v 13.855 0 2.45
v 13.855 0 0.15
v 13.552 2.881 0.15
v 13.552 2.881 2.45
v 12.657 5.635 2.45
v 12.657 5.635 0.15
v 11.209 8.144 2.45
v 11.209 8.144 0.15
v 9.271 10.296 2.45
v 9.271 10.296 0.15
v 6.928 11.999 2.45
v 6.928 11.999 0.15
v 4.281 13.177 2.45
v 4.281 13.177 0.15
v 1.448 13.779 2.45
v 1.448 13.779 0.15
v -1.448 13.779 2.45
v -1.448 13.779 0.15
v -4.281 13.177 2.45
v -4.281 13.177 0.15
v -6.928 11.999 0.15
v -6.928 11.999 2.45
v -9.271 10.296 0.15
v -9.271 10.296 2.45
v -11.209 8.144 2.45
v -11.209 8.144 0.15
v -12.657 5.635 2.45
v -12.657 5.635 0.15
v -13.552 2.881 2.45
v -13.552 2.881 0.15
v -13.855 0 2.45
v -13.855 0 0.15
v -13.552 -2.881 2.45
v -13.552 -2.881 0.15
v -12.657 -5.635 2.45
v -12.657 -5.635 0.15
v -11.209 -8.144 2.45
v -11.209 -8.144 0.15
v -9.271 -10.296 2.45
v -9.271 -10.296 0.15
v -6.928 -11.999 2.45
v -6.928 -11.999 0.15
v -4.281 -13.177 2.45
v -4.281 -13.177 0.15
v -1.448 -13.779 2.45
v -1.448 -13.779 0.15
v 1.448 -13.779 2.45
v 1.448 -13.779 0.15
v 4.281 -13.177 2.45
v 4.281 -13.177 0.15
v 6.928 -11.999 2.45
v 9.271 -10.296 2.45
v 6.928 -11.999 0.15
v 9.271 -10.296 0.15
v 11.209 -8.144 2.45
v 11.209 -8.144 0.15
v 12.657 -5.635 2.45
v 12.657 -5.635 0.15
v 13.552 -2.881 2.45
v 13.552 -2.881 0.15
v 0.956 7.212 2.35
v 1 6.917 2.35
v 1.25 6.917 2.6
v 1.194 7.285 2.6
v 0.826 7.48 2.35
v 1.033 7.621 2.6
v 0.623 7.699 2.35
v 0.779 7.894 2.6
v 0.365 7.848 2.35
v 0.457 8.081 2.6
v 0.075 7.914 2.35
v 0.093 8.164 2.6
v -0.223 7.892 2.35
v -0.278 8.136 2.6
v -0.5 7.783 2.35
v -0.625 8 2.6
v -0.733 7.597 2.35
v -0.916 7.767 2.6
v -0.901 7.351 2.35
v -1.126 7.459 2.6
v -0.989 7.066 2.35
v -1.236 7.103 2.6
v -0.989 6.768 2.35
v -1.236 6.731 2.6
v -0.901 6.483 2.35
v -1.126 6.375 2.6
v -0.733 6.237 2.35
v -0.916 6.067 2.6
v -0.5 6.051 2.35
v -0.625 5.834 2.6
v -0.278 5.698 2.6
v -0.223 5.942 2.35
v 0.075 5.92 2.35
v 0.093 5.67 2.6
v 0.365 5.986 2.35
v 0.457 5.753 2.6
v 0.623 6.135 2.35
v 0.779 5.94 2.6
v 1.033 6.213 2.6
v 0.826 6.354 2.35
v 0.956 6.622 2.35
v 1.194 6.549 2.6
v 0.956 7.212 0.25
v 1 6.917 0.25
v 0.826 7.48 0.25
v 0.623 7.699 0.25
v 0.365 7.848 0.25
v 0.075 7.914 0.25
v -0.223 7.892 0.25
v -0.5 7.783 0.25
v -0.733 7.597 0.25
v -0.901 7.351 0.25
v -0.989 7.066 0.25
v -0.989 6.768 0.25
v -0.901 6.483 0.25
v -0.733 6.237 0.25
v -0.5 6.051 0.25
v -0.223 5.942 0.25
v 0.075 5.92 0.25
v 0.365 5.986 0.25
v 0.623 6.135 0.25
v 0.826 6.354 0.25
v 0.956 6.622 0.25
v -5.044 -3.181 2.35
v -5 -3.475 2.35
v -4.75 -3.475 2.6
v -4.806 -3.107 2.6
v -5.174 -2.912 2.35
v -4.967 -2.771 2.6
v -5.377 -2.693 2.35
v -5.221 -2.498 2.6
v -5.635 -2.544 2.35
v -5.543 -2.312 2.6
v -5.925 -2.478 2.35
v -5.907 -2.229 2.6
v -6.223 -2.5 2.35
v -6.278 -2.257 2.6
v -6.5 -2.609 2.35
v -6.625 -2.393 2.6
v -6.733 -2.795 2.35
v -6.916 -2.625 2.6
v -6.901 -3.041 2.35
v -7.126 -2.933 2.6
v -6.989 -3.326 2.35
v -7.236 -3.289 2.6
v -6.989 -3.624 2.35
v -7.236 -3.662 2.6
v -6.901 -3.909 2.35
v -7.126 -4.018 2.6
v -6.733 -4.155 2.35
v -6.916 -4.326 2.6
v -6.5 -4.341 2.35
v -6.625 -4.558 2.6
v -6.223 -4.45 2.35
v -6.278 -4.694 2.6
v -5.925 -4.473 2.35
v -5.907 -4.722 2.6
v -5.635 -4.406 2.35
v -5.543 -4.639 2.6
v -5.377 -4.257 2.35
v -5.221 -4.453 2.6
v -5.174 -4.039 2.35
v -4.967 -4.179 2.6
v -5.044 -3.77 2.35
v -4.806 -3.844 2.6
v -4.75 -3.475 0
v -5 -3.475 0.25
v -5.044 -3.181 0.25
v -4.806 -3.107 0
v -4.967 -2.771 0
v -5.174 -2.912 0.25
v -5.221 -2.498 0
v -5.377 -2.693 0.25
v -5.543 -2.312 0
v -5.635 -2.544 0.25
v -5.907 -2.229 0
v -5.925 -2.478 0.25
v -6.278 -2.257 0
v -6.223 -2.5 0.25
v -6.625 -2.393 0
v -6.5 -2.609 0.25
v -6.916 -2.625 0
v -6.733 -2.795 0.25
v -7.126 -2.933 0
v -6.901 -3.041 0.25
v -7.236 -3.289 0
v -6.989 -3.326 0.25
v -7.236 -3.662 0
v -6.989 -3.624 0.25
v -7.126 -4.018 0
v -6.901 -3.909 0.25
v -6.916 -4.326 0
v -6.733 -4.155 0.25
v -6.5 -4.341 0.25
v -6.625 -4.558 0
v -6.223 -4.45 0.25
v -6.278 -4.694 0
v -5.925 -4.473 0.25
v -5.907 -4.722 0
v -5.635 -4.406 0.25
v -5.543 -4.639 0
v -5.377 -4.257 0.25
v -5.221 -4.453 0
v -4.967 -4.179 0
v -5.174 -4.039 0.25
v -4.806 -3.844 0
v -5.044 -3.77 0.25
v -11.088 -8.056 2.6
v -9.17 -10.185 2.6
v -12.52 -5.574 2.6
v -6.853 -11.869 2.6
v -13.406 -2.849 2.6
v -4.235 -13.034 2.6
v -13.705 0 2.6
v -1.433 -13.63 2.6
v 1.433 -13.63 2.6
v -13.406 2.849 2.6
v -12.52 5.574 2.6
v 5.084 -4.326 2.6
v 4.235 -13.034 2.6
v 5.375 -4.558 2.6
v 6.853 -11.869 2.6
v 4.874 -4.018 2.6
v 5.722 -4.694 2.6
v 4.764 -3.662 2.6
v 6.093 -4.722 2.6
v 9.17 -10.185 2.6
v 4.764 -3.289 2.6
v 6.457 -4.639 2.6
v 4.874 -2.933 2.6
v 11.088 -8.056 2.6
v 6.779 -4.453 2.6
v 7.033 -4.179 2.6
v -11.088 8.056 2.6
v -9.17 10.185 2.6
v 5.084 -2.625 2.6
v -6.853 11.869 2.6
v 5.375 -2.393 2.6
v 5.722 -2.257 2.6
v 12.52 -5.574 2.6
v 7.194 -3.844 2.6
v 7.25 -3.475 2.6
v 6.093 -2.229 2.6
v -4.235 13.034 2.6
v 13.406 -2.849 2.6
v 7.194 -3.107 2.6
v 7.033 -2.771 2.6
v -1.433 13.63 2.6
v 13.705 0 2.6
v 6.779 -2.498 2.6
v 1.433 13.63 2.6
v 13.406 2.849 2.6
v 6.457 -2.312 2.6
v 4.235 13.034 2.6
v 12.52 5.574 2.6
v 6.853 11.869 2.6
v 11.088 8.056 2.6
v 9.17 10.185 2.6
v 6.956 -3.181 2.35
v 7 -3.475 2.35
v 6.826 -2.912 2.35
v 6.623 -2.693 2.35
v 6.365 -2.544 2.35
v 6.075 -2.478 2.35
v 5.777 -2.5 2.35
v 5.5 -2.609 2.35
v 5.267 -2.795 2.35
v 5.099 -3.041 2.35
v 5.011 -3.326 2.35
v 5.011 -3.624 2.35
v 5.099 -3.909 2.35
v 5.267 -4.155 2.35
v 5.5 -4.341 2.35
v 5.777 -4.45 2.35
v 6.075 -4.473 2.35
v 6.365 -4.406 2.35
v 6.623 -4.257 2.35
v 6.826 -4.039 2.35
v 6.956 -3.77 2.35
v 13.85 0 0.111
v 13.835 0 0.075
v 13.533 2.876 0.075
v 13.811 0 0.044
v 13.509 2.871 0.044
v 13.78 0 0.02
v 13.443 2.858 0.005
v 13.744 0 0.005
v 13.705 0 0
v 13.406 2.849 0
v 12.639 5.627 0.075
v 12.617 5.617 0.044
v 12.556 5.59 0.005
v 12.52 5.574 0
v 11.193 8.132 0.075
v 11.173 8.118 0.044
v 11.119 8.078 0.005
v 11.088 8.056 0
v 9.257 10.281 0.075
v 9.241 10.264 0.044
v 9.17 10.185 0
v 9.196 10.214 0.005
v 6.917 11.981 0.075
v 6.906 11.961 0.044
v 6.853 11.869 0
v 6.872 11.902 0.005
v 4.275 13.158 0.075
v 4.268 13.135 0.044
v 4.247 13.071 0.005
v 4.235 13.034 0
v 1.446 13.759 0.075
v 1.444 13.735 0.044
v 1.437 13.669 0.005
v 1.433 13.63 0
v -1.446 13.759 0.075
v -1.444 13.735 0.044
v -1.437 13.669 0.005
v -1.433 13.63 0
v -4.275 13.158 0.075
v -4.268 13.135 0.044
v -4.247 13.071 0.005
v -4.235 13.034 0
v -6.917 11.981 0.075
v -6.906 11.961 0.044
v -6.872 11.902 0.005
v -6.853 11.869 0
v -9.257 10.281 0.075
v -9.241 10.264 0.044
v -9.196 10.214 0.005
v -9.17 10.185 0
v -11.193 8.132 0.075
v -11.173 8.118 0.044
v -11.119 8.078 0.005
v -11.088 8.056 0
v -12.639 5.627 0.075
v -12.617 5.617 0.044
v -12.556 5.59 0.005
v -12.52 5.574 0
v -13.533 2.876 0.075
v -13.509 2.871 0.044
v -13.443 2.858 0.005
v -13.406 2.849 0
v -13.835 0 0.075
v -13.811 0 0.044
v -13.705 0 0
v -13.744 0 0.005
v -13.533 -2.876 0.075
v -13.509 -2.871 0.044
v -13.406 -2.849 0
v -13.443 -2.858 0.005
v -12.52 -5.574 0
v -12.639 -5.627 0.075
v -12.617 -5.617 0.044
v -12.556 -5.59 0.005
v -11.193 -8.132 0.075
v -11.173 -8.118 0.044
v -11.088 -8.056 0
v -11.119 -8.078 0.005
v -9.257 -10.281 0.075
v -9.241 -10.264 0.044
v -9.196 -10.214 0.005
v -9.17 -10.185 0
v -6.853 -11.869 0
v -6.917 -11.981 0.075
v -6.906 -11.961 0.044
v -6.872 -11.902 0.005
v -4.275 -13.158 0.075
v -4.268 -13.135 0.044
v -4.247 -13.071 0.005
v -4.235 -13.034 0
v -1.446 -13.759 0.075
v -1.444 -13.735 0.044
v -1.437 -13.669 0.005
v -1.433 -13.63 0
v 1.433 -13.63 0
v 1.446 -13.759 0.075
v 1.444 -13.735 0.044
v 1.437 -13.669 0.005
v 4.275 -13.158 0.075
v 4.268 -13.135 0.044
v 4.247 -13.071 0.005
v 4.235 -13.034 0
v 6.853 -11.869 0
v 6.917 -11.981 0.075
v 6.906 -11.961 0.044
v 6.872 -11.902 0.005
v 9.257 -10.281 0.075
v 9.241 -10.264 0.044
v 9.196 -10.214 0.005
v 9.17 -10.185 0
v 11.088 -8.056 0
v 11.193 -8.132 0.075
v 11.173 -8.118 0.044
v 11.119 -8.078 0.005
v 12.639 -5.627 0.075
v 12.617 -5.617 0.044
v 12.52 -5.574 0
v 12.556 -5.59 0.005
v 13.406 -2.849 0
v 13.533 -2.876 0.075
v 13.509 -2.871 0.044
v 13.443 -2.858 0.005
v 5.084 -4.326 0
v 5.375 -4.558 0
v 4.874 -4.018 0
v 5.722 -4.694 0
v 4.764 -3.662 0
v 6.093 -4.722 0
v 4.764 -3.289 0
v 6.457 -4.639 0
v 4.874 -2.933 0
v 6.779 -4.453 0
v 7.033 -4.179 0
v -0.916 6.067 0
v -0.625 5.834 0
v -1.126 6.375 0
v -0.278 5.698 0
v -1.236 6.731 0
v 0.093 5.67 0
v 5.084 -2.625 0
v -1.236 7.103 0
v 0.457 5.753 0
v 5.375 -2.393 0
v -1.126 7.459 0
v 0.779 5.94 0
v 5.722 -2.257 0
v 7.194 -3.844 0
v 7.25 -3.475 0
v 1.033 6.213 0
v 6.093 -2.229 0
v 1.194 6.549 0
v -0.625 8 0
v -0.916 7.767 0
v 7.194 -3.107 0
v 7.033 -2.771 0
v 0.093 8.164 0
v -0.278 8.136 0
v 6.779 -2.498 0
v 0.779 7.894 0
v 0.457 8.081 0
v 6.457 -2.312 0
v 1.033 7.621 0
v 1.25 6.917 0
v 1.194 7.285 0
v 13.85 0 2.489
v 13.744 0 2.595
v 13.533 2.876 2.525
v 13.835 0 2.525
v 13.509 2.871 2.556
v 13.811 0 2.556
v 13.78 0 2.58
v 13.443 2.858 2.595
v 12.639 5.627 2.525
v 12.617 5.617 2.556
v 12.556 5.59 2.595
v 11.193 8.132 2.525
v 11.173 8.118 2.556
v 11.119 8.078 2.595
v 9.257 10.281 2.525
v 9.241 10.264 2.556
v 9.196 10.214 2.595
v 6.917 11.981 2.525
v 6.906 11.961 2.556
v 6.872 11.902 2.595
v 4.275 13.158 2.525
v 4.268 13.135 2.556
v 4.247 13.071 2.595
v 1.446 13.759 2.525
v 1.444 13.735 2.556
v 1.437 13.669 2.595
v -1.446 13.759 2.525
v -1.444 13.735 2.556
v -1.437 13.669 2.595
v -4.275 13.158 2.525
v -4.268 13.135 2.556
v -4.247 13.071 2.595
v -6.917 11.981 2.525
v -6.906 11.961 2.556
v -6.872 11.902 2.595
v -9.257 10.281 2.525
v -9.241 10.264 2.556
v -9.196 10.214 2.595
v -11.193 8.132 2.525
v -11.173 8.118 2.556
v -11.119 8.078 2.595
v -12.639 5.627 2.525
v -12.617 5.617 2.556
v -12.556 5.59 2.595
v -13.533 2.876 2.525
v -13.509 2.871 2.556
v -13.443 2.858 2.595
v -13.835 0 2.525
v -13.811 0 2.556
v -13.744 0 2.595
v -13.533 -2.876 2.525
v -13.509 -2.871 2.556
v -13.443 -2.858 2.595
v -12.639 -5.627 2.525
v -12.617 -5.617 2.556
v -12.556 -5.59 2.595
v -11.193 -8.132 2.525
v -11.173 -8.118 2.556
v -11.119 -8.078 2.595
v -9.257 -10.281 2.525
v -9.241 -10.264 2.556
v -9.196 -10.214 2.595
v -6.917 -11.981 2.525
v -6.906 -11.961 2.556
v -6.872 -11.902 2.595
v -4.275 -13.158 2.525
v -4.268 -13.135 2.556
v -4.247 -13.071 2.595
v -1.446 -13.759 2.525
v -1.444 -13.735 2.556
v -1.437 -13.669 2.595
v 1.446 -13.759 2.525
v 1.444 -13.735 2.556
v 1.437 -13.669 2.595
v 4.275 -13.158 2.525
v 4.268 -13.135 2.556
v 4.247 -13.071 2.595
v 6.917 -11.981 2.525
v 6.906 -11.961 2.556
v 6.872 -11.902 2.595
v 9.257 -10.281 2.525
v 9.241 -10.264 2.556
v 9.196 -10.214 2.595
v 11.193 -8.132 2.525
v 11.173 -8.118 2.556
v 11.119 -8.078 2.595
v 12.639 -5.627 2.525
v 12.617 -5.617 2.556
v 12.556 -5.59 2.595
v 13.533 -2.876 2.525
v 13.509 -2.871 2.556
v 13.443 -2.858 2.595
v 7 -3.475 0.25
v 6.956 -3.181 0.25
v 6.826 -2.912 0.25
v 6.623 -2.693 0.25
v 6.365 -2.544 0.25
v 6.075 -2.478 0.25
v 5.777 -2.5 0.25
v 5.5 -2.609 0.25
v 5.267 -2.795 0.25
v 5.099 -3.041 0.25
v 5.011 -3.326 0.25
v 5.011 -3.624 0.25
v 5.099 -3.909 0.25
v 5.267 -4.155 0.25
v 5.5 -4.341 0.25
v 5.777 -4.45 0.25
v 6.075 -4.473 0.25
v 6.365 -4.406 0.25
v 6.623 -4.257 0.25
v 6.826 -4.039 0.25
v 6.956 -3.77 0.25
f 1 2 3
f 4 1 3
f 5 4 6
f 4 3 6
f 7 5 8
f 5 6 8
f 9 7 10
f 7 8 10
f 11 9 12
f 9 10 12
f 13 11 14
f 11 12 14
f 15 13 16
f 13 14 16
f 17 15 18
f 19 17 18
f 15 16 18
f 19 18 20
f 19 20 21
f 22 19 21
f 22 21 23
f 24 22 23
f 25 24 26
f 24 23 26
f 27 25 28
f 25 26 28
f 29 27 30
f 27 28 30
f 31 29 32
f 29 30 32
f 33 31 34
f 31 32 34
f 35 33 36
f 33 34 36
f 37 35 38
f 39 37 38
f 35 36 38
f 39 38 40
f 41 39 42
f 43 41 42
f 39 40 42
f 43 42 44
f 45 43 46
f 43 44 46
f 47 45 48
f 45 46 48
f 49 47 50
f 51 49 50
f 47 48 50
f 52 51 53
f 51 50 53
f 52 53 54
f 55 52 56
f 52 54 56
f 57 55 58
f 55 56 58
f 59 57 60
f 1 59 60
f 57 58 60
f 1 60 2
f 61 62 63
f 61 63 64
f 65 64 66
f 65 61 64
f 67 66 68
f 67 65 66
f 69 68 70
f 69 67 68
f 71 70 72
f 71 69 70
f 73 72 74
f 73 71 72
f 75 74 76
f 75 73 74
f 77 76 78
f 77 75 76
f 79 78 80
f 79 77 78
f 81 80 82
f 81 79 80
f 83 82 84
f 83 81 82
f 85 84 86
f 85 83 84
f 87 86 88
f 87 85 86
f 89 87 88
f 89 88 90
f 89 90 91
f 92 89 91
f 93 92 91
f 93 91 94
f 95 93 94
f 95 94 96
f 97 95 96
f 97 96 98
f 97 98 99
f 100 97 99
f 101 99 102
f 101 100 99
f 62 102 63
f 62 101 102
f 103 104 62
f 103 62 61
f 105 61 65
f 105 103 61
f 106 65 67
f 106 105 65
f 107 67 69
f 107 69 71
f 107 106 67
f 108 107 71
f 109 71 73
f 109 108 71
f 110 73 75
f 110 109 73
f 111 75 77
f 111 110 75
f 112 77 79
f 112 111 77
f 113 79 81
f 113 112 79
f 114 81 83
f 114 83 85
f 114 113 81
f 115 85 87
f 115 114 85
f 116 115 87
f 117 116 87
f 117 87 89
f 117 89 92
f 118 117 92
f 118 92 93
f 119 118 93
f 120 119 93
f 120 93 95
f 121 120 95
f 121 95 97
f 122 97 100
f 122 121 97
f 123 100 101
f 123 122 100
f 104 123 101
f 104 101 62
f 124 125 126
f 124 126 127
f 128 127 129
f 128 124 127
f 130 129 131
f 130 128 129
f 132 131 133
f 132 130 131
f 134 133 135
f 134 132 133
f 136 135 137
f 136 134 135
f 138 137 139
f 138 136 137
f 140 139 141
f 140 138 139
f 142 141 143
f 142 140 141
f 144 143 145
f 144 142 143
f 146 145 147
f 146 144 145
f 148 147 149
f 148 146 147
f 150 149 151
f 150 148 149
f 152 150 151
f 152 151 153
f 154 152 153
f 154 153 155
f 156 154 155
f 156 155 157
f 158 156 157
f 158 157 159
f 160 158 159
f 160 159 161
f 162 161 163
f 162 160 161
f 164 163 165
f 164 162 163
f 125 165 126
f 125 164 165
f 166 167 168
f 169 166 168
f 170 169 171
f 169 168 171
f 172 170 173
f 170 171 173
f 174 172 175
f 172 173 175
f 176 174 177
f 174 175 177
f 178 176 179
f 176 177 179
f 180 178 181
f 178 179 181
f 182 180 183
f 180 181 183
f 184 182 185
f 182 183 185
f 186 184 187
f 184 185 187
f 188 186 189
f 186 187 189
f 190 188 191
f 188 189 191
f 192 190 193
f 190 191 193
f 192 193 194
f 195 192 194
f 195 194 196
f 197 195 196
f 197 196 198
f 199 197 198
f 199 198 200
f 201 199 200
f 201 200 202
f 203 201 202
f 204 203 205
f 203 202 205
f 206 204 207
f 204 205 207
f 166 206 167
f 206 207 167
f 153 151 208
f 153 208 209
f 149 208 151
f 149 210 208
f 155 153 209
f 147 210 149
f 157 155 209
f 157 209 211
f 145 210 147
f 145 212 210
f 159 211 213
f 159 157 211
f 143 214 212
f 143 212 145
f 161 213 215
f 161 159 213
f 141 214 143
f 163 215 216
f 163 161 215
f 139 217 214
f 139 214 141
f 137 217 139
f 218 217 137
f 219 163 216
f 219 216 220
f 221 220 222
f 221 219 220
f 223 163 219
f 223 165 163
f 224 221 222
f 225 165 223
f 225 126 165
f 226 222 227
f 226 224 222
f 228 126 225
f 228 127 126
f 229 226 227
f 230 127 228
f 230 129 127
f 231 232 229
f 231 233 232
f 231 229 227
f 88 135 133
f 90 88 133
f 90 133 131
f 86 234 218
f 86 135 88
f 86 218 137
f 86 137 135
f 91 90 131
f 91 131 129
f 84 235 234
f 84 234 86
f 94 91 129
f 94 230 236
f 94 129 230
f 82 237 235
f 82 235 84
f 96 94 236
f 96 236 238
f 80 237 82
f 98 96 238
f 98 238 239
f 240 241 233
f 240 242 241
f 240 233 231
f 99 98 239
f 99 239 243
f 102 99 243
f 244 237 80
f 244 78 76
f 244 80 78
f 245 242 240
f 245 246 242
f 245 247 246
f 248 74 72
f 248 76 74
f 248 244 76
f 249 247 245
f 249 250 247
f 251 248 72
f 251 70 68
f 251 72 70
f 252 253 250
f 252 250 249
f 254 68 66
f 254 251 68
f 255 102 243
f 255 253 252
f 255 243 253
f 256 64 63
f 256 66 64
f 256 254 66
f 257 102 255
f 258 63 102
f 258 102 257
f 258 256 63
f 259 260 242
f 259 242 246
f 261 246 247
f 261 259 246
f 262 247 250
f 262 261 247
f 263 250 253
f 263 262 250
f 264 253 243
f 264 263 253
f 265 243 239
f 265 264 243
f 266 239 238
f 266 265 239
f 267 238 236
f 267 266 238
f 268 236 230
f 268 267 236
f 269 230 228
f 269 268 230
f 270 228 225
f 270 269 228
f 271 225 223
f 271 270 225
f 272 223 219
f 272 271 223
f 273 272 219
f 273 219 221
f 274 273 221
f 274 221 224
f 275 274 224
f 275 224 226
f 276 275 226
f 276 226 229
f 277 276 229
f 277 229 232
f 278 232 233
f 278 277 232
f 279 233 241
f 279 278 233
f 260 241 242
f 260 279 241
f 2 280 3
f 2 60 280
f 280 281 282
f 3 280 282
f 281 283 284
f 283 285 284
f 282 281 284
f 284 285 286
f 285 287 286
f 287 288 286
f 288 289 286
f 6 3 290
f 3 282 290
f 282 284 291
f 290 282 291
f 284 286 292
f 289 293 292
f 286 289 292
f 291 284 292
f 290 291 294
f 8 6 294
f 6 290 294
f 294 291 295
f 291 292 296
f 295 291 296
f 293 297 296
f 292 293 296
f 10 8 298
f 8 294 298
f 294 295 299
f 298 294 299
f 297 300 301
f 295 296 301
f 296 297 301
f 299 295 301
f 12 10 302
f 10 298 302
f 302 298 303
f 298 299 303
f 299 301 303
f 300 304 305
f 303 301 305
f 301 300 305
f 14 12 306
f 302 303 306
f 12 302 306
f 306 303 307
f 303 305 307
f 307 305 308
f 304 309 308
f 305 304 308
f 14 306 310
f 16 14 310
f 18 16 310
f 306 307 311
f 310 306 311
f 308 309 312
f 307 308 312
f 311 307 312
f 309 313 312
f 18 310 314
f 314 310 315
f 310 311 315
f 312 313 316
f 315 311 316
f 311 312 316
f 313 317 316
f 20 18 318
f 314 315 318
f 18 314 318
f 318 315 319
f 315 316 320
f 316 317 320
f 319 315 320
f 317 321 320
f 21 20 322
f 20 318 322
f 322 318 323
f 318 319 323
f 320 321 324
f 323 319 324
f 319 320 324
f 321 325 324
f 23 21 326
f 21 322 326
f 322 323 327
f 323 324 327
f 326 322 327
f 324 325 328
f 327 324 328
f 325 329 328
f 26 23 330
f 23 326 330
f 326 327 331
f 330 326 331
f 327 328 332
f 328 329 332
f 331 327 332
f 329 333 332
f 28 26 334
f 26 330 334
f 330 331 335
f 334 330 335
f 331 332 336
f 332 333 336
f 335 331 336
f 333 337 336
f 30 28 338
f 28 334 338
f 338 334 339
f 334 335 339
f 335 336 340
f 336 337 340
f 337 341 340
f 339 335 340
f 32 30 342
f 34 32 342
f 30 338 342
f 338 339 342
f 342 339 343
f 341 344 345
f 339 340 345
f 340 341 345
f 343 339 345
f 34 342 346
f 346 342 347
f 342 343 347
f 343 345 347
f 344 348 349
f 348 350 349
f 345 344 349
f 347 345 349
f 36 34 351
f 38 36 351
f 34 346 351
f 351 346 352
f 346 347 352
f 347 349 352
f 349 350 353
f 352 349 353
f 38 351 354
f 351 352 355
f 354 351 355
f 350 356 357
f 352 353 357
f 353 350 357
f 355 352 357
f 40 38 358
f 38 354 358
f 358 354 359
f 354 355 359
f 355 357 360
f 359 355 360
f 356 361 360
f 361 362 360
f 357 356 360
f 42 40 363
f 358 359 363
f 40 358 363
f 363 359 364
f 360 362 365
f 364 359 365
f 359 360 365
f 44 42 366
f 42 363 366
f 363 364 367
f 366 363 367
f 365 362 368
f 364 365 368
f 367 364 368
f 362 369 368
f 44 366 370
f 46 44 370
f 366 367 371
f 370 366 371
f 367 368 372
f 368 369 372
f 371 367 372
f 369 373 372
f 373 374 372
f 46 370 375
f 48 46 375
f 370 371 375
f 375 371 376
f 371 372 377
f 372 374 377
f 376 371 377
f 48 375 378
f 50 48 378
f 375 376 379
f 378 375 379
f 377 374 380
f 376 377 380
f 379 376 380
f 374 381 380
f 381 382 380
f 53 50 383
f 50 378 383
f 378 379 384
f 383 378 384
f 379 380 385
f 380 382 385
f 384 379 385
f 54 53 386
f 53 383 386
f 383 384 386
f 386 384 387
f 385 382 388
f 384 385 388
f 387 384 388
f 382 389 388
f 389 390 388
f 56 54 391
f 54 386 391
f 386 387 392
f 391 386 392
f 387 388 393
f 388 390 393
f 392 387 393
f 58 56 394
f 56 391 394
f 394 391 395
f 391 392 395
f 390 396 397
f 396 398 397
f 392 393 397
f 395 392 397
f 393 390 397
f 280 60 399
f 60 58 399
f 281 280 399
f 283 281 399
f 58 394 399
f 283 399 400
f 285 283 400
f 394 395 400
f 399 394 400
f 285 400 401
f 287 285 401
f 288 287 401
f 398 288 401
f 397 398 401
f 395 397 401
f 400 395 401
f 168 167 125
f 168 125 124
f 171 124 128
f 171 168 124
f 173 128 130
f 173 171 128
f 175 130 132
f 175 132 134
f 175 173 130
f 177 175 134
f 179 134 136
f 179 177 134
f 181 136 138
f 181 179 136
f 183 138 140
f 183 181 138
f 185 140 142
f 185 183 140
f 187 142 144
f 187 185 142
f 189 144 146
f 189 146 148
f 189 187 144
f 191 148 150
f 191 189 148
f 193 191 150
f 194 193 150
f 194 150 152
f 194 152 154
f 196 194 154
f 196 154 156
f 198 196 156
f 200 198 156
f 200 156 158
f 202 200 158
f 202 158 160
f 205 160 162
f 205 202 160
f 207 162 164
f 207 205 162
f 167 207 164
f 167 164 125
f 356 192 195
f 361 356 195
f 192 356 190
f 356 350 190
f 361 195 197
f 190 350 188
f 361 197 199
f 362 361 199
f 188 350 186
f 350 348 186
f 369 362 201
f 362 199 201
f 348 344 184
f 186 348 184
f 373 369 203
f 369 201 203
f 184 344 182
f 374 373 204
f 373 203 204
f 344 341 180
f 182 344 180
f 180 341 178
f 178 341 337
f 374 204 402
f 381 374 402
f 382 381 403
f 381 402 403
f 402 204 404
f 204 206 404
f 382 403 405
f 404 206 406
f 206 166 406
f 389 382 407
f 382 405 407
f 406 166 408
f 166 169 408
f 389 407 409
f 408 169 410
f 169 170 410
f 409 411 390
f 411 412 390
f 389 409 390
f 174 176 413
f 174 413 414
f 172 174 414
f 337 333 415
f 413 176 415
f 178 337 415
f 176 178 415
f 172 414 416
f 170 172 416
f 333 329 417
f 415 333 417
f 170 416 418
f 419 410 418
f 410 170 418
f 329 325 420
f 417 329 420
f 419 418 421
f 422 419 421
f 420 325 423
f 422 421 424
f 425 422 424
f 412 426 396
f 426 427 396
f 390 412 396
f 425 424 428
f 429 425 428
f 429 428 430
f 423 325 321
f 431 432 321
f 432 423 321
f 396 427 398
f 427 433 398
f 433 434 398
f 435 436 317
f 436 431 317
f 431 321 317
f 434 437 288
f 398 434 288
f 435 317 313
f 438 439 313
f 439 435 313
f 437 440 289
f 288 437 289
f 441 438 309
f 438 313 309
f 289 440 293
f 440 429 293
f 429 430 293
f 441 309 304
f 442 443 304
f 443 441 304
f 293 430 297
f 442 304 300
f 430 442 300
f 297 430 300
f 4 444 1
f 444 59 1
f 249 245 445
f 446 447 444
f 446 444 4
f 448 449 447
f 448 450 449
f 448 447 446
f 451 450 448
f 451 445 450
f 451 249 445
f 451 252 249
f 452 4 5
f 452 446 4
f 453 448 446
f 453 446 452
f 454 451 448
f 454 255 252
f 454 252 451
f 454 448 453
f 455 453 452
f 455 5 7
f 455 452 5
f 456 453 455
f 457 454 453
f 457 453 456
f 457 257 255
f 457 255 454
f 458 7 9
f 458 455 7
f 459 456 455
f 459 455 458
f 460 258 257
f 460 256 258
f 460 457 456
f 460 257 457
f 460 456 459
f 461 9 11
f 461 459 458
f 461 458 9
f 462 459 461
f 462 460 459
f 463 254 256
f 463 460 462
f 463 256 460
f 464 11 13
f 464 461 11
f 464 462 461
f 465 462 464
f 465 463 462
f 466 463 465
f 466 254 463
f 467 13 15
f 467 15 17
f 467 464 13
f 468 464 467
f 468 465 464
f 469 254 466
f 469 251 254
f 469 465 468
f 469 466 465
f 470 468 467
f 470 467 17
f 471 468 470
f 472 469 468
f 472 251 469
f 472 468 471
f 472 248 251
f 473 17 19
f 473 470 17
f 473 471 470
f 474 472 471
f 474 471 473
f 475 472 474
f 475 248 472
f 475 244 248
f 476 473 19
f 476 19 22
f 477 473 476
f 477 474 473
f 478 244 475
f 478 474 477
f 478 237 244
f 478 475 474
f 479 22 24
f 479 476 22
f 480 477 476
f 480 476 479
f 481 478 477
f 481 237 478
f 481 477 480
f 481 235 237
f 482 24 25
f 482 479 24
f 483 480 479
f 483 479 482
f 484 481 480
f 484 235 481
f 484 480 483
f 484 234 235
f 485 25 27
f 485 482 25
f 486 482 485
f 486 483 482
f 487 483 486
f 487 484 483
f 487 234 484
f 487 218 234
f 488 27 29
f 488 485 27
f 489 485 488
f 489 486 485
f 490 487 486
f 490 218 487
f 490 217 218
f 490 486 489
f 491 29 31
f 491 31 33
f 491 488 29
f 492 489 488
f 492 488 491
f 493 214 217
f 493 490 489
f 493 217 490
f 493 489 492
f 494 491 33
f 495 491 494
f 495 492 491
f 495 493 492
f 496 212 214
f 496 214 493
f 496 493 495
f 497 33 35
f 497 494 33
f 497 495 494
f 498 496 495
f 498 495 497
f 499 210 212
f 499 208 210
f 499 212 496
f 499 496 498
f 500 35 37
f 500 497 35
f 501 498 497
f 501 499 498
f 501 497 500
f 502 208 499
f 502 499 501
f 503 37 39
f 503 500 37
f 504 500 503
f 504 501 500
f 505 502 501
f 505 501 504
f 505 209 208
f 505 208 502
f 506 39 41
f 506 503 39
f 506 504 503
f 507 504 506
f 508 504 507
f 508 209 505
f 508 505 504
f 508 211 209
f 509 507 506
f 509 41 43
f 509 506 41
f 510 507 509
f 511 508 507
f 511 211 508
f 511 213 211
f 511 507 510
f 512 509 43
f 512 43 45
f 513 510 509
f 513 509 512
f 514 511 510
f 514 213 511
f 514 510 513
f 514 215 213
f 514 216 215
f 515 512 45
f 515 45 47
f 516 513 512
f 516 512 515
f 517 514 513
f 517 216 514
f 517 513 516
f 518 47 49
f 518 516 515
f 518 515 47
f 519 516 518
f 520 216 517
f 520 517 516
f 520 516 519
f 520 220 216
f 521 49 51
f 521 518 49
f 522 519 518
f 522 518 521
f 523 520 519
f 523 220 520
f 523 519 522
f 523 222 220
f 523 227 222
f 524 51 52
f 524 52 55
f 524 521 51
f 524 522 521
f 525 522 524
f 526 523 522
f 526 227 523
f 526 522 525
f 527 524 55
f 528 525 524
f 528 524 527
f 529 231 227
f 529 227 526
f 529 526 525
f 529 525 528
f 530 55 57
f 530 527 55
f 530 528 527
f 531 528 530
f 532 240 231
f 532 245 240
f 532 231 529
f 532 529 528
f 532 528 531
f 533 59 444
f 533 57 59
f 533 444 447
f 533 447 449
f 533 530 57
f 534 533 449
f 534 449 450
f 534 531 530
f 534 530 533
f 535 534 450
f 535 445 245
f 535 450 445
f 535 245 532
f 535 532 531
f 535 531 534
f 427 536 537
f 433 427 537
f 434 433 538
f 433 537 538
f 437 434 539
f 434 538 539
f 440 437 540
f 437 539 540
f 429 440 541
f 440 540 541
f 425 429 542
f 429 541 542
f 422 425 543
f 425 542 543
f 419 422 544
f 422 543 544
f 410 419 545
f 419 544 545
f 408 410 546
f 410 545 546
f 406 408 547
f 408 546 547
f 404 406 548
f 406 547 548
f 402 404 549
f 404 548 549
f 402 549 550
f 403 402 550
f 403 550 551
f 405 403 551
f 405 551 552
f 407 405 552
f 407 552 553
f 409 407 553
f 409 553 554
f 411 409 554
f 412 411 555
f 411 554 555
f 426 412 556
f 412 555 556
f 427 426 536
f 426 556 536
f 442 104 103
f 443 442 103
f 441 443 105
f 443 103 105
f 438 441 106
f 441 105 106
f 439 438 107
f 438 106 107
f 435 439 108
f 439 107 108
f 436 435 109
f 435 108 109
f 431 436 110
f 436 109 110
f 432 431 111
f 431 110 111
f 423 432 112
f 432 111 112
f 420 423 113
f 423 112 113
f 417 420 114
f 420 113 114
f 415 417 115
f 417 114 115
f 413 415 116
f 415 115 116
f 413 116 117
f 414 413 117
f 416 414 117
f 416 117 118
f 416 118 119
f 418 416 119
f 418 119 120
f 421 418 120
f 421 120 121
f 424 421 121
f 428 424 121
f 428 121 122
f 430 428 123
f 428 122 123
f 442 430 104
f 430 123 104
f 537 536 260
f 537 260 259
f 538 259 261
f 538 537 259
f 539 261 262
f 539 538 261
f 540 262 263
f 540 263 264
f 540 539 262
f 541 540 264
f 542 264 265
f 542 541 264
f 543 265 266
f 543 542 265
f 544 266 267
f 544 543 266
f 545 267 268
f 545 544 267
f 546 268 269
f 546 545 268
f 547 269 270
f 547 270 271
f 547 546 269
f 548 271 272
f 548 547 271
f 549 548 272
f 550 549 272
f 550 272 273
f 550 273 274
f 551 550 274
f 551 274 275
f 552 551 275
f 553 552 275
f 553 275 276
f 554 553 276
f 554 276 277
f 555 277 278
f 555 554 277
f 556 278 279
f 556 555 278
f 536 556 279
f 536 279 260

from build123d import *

# Parameters (mm, degrees)
F0_R     = 13.855
F0_R_2   = 1
F1_DEPTH = 2.6
F2_R     = 0.15
F3_SIZE  = 0.25


with BuildPart() as f1:
    # F0 (on Top) → F1 (new body)
    with BuildSketch(Plane.XY):
        Circle(F0_R)
        with Locations((-6, -3.475305)):
            Circle(F0_R_2, mode=Mode.SUBTRACT)
        with Locations((6, -3.475305)):
            Circle(F0_R_2, mode=Mode.SUBTRACT)
        with Locations((0, 6.917)):
            Circle(F0_R_2, mode=Mode.SUBTRACT)
    extrude(amount=F1_DEPTH)

    # F2
    f2_edges = [f1.edges().sort_by_distance(p)[0] for p in [
        (-13.855, 0, 2.6),
        (-13.855, 0, 0),
    ]]
    fillet(f2_edges, radius=F2_R)

    # F3
    f3_edges = [f1.edges().sort_by_distance(p)[0] for p in [
        (-1, 6.917, 2.6),
        (5, -3.475305, 2.6),
        (5, -3.475305, 0),
        (-1, 6.917, 0),
        (-7, -3.475305, 2.6),
        (-7, -3.475305, 0),
    ]]
    chamfer(f3_edges, length=F3_SIZE)


solid = f1.part
